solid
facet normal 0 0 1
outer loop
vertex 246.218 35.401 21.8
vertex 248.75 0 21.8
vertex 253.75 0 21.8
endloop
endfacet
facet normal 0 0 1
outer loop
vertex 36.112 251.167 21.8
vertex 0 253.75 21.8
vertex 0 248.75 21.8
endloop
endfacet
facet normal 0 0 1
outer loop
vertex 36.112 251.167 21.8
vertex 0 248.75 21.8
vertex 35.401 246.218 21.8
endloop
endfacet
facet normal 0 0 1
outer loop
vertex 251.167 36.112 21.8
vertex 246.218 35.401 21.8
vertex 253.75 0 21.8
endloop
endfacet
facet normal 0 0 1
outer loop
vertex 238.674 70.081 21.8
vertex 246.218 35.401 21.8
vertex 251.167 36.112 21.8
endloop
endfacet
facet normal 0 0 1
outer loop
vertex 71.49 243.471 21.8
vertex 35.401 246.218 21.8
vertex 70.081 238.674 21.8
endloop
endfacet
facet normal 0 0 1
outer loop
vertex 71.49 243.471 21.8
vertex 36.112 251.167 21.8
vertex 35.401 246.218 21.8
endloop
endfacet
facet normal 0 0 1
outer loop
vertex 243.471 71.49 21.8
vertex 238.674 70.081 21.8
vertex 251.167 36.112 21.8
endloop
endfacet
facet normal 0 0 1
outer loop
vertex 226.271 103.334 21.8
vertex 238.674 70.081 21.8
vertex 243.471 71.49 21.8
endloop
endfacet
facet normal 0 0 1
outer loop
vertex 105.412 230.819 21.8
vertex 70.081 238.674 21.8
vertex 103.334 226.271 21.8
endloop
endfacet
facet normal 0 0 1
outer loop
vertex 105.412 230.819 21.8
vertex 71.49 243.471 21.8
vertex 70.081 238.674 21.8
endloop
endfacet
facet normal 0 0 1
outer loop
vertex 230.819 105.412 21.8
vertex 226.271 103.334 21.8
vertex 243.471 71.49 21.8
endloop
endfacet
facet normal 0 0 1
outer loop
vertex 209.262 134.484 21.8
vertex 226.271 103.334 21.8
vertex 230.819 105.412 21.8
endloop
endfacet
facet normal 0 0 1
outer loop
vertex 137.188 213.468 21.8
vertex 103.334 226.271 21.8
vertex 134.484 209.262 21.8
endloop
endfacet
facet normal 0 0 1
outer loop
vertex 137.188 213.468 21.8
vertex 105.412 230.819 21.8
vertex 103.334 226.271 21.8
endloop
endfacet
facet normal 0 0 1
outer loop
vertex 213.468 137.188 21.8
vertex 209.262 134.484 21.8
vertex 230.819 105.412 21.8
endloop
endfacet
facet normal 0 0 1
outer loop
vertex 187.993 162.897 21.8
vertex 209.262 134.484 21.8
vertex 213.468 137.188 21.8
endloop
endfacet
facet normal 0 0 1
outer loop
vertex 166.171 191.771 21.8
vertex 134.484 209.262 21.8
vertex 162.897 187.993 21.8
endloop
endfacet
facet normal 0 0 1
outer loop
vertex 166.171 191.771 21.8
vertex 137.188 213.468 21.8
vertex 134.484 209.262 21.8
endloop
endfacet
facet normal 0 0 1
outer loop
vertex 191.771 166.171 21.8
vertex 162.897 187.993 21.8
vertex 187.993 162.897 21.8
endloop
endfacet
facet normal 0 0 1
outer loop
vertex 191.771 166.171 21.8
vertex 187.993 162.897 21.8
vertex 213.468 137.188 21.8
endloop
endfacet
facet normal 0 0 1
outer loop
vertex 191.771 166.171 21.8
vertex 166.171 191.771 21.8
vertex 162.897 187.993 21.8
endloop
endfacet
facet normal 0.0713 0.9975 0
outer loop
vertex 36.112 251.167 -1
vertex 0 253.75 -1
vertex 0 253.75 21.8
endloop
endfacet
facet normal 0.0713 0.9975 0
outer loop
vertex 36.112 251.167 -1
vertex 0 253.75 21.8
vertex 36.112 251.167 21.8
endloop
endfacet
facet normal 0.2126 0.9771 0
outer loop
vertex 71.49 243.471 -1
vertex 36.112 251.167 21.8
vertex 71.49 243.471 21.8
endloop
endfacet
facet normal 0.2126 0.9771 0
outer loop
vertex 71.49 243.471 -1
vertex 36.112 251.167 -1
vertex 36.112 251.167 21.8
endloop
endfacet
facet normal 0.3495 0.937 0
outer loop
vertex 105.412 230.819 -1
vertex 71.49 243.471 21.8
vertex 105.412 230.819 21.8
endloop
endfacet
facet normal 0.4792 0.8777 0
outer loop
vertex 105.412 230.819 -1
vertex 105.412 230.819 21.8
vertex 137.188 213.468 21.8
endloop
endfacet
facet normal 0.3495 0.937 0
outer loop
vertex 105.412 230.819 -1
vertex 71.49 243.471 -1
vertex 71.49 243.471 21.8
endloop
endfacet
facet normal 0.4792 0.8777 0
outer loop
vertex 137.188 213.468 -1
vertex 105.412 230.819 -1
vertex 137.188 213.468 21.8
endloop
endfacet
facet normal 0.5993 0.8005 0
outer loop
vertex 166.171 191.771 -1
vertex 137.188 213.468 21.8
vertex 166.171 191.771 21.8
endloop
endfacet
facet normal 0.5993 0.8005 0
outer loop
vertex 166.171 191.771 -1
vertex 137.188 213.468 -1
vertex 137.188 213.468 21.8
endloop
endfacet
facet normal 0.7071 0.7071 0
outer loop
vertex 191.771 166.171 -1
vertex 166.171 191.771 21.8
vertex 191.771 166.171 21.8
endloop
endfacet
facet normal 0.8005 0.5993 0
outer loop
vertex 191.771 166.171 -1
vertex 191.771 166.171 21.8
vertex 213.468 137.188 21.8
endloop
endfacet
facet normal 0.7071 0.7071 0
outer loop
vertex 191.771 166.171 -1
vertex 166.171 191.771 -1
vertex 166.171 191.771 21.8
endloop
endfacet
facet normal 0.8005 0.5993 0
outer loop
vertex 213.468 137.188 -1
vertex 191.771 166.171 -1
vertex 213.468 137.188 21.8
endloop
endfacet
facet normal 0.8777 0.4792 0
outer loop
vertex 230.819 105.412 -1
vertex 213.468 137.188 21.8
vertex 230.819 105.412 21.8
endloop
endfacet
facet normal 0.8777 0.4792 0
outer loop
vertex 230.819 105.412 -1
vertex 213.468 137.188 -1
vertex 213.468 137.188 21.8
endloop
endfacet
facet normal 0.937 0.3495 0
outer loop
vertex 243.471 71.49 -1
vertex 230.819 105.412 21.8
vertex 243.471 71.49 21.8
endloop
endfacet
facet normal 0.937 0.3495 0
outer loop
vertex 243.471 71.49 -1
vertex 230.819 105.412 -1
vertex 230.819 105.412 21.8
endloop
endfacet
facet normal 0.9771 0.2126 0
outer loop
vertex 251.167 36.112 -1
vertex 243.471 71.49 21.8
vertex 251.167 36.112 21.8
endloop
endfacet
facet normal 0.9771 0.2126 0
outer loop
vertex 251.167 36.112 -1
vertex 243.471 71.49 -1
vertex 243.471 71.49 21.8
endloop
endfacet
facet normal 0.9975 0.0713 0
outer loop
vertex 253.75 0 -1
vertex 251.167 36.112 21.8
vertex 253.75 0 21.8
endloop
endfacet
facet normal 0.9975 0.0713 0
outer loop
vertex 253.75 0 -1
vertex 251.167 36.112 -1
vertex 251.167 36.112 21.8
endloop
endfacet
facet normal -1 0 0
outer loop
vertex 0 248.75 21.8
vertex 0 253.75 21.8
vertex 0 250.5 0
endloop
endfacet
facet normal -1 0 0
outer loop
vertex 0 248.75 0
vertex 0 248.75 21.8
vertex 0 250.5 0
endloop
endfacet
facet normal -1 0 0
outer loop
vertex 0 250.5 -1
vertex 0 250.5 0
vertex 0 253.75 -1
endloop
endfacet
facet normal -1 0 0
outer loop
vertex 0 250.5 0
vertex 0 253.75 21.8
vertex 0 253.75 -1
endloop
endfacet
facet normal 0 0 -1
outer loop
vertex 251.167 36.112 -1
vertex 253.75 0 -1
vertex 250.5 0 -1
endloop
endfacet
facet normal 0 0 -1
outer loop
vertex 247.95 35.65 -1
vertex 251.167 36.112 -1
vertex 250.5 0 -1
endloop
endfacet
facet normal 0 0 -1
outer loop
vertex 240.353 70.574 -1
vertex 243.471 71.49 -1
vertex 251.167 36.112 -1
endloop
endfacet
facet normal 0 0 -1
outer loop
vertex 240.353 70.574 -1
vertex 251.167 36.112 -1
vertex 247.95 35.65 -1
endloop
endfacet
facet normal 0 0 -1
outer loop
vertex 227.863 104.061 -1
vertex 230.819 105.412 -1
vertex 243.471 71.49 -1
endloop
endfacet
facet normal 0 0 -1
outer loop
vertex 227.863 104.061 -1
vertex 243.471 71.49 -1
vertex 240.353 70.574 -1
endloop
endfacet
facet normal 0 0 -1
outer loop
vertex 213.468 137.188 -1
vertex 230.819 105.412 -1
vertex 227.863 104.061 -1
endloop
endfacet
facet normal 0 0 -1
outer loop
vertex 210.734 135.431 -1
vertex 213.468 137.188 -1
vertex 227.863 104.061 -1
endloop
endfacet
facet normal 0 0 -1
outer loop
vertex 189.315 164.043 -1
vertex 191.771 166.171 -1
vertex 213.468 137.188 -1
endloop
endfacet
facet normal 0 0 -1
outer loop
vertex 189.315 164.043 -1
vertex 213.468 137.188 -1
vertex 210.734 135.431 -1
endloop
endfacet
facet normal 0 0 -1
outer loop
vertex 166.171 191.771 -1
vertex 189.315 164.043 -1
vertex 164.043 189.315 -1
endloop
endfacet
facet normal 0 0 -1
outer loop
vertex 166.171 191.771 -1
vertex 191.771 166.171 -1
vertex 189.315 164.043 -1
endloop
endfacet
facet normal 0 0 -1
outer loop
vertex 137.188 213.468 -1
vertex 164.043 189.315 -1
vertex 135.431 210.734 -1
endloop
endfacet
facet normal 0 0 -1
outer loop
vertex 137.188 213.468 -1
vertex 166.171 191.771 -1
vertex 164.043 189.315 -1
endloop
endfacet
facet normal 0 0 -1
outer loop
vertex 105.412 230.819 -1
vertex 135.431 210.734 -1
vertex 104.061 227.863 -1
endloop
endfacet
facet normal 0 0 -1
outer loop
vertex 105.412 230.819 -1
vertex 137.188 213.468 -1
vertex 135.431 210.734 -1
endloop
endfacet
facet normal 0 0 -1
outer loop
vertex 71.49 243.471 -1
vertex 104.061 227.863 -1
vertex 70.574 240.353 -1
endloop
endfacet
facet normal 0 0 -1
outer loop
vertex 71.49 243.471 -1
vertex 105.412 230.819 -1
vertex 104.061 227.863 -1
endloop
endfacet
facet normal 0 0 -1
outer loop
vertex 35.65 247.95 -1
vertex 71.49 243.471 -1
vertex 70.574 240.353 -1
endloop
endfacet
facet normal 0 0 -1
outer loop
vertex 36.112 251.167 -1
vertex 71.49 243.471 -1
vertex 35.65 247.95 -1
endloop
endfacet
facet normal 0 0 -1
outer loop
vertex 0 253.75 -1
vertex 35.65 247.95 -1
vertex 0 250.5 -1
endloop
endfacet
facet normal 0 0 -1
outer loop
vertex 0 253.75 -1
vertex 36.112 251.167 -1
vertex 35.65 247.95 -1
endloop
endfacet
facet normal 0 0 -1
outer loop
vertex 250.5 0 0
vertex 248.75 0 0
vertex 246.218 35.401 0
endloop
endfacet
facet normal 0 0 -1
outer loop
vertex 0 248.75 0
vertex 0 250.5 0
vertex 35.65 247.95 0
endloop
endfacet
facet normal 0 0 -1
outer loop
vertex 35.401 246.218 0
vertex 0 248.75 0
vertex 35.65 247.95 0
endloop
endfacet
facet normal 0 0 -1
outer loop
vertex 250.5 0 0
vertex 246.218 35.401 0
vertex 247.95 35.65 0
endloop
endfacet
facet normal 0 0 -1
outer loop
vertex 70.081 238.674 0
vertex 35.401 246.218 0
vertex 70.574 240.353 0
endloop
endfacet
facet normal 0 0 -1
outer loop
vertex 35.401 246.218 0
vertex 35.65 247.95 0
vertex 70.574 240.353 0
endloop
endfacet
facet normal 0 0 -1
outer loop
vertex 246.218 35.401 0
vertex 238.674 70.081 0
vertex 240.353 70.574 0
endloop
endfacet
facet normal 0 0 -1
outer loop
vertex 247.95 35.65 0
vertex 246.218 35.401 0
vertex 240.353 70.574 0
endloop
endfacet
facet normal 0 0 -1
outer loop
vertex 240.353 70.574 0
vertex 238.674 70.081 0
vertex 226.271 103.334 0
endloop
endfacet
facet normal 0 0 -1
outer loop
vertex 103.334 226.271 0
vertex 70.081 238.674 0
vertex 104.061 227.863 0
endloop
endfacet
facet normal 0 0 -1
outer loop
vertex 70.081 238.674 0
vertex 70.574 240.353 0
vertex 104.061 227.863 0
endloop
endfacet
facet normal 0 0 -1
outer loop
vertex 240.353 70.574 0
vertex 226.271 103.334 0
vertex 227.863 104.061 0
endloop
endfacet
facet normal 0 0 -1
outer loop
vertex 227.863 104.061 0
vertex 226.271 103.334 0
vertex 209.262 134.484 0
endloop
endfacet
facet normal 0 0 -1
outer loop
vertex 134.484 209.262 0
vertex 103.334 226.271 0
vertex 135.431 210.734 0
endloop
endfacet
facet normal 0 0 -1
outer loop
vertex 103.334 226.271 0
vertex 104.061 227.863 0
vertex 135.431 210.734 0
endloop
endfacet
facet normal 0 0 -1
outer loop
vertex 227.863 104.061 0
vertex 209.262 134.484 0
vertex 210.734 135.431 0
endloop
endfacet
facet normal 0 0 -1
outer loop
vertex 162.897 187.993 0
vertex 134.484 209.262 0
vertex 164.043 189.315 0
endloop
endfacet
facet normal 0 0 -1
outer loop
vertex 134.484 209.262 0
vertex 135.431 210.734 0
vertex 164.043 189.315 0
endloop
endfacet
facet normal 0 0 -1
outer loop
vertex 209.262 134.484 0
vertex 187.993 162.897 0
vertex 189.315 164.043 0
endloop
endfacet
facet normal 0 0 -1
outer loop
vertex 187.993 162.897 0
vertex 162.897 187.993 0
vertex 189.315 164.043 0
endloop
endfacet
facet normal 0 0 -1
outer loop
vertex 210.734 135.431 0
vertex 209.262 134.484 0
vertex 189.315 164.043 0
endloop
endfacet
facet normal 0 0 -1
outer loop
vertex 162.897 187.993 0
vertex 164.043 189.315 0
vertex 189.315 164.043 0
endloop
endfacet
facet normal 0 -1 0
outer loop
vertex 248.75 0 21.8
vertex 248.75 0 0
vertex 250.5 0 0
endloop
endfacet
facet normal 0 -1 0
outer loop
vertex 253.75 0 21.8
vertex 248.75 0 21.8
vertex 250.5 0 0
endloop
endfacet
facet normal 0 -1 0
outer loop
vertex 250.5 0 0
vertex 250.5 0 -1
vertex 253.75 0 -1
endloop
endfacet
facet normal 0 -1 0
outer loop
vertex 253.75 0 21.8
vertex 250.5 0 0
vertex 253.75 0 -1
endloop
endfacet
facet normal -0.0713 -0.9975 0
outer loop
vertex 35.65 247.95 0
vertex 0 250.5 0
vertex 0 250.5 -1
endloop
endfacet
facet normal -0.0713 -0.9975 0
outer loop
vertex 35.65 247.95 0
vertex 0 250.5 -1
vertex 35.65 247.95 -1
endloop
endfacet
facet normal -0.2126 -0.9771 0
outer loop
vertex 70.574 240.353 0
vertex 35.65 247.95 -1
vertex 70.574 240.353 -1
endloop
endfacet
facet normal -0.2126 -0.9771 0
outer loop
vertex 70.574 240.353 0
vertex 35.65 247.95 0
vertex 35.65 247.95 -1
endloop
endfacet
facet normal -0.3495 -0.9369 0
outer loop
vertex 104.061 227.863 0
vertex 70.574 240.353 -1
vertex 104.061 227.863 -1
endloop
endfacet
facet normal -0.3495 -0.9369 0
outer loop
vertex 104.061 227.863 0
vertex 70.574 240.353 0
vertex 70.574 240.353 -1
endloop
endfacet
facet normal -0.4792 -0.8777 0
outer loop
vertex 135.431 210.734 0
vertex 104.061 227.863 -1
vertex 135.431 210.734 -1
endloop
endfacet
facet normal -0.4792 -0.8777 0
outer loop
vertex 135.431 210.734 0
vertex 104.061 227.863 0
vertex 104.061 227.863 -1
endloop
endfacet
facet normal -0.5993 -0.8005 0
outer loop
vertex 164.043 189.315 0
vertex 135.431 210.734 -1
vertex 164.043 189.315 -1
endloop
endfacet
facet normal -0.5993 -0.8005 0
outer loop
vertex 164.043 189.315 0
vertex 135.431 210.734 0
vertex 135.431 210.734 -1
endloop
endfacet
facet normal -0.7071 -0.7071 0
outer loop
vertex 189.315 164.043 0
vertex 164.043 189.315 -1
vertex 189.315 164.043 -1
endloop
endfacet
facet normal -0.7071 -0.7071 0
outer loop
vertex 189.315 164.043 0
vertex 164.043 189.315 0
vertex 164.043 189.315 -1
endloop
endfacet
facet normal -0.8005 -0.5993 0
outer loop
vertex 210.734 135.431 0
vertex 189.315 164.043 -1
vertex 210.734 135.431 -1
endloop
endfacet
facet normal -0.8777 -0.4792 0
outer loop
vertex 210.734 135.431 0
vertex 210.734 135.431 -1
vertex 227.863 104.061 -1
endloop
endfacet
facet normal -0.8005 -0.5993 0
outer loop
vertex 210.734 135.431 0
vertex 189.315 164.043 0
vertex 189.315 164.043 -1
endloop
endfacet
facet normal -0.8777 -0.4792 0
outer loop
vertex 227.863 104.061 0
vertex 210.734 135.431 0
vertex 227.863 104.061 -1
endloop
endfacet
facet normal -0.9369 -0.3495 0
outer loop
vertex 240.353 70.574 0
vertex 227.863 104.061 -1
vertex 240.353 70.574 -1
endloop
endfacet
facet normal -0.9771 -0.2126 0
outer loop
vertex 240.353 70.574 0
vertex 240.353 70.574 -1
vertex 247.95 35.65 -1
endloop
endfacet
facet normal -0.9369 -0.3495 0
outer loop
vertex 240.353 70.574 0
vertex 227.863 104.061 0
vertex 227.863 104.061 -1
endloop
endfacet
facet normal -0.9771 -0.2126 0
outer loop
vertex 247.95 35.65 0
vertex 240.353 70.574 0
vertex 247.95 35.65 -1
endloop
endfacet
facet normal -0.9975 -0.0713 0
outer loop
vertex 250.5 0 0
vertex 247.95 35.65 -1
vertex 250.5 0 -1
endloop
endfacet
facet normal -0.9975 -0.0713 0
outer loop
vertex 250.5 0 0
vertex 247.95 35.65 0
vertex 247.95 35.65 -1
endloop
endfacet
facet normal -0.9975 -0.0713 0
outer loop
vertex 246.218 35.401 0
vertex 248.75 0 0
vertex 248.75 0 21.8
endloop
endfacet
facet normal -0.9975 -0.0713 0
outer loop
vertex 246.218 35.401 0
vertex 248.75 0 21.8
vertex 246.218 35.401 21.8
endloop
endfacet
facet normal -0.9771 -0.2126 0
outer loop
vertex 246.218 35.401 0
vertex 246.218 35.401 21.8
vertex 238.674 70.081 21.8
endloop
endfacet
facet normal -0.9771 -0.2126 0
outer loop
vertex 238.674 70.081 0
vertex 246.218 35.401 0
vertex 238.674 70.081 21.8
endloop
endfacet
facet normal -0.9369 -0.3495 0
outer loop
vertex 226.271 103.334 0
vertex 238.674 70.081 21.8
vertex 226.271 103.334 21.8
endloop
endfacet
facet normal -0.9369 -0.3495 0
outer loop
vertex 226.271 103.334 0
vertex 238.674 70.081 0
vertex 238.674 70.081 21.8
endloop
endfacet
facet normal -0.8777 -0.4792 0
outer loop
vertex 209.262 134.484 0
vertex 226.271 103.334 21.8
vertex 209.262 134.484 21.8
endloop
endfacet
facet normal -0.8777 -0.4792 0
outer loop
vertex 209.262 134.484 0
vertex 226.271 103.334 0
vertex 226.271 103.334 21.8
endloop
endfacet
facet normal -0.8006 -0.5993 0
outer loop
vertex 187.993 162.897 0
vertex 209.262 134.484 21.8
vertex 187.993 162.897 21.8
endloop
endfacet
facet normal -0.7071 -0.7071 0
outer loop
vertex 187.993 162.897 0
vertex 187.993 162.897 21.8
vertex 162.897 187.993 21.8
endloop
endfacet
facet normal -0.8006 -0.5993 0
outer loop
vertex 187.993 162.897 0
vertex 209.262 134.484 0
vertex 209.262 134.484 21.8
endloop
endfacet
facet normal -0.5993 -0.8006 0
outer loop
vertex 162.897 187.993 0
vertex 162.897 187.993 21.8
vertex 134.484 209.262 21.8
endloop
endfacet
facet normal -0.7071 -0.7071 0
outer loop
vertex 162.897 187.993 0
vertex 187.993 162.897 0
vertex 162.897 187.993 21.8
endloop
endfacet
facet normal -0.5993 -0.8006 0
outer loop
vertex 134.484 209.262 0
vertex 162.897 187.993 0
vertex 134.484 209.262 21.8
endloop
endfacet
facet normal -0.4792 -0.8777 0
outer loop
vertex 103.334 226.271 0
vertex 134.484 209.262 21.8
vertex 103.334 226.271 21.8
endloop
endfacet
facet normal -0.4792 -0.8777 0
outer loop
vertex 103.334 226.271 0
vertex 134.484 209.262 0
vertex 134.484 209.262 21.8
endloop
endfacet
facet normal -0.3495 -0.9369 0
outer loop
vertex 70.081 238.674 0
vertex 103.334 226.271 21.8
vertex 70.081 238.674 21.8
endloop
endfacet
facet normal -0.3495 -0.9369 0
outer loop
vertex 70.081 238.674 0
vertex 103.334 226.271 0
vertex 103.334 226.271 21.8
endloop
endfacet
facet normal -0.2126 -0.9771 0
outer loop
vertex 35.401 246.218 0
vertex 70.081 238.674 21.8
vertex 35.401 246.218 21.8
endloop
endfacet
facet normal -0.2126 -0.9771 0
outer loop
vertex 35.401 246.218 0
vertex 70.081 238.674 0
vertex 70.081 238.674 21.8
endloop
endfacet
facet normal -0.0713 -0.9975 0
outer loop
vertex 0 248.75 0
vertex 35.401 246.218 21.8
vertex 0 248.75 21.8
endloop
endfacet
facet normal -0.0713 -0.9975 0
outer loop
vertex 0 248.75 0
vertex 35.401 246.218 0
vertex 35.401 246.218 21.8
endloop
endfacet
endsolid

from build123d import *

# Parameters (mm, degrees)
SKETCH1_R                       = 252.5
SKETCH1_R_2                     = 248.75
BOSS_EXTRUDE1_DEPTH             = 21.8
SKETCH2_R                       = 253.75
SKETCH2_R_2                     = 250.5
BOSS_EXTRUDE2_DEPTH             = 1
BOSS_EXTRUDE2_DIRECTION_2_REACH = 359.754


with BuildPart() as part:
    # Sketch1 → Boss-Extrude1 (new body)
    with BuildSketch(Plane.XY):
        Circle(SKETCH1_R)
        Circle(SKETCH1_R_2, mode=Mode.SUBTRACT)
    extrude(amount=BOSS_EXTRUDE1_DEPTH)

    # Sketch2 → Boss-Extrude2 (add)
    with BuildSketch(Plane(origin=(0, 0, 0), x_dir=(-1, 0, 0), z_dir=(0, 0, -1))):
        Circle(SKETCH2_R)
        Circle(SKETCH2_R_2, mode=Mode.SUBTRACT)
    extrude(amount=BOSS_EXTRUDE2_DEPTH)

    # Boss-Extrude2 direction 2: up to this face of the body (flat: up to its plane)
    boss_extrude2_direction_2_end = Plane(part.part.faces().sort_by_distance((-251.785822151, 0, 21.8))[0])
    # Sketch2 → Boss-Extrude2 direction 2 (add, up to the picked face)
    with BuildSketch(Plane(origin=(0, 0, 0), x_dir=(-1, 0, 0), z_dir=(0, 0, -1)), mode=Mode.PRIVATE) as boss_extrude2_direction_2_sk1:
        Circle(SKETCH2_R)
        Circle(SKETCH2_R_2, mode=Mode.SUBTRACT)
    boss_extrude2_direction_2_tool1 = split(extrude(boss_extrude2_direction_2_sk1.sketch, amount=-BOSS_EXTRUDE2_DIRECTION_2_REACH, mode=Mode.PRIVATE), bisect_by=boss_extrude2_direction_2_end, keep=Keep.BOTH, mode=Mode.PRIVATE)
    add(boss_extrude2_direction_2_tool1.solids().sort_by(Axis((253.032287, 0, 0), (0, 0, 1)))[0])

    # SurfaceCut1
    split(bisect_by=Plane(origin=(0, 0, 0), x_dir=(1, 0, 0), z_dir=(0, 1, 0)), keep=Keep.TOP)

    # SurfaceCut2
    split(bisect_by=Plane(origin=(0, 0, 0), x_dir=(0, 0, -1), z_dir=(1, 0, 0)), keep=Keep.TOP)


solid = part.part
